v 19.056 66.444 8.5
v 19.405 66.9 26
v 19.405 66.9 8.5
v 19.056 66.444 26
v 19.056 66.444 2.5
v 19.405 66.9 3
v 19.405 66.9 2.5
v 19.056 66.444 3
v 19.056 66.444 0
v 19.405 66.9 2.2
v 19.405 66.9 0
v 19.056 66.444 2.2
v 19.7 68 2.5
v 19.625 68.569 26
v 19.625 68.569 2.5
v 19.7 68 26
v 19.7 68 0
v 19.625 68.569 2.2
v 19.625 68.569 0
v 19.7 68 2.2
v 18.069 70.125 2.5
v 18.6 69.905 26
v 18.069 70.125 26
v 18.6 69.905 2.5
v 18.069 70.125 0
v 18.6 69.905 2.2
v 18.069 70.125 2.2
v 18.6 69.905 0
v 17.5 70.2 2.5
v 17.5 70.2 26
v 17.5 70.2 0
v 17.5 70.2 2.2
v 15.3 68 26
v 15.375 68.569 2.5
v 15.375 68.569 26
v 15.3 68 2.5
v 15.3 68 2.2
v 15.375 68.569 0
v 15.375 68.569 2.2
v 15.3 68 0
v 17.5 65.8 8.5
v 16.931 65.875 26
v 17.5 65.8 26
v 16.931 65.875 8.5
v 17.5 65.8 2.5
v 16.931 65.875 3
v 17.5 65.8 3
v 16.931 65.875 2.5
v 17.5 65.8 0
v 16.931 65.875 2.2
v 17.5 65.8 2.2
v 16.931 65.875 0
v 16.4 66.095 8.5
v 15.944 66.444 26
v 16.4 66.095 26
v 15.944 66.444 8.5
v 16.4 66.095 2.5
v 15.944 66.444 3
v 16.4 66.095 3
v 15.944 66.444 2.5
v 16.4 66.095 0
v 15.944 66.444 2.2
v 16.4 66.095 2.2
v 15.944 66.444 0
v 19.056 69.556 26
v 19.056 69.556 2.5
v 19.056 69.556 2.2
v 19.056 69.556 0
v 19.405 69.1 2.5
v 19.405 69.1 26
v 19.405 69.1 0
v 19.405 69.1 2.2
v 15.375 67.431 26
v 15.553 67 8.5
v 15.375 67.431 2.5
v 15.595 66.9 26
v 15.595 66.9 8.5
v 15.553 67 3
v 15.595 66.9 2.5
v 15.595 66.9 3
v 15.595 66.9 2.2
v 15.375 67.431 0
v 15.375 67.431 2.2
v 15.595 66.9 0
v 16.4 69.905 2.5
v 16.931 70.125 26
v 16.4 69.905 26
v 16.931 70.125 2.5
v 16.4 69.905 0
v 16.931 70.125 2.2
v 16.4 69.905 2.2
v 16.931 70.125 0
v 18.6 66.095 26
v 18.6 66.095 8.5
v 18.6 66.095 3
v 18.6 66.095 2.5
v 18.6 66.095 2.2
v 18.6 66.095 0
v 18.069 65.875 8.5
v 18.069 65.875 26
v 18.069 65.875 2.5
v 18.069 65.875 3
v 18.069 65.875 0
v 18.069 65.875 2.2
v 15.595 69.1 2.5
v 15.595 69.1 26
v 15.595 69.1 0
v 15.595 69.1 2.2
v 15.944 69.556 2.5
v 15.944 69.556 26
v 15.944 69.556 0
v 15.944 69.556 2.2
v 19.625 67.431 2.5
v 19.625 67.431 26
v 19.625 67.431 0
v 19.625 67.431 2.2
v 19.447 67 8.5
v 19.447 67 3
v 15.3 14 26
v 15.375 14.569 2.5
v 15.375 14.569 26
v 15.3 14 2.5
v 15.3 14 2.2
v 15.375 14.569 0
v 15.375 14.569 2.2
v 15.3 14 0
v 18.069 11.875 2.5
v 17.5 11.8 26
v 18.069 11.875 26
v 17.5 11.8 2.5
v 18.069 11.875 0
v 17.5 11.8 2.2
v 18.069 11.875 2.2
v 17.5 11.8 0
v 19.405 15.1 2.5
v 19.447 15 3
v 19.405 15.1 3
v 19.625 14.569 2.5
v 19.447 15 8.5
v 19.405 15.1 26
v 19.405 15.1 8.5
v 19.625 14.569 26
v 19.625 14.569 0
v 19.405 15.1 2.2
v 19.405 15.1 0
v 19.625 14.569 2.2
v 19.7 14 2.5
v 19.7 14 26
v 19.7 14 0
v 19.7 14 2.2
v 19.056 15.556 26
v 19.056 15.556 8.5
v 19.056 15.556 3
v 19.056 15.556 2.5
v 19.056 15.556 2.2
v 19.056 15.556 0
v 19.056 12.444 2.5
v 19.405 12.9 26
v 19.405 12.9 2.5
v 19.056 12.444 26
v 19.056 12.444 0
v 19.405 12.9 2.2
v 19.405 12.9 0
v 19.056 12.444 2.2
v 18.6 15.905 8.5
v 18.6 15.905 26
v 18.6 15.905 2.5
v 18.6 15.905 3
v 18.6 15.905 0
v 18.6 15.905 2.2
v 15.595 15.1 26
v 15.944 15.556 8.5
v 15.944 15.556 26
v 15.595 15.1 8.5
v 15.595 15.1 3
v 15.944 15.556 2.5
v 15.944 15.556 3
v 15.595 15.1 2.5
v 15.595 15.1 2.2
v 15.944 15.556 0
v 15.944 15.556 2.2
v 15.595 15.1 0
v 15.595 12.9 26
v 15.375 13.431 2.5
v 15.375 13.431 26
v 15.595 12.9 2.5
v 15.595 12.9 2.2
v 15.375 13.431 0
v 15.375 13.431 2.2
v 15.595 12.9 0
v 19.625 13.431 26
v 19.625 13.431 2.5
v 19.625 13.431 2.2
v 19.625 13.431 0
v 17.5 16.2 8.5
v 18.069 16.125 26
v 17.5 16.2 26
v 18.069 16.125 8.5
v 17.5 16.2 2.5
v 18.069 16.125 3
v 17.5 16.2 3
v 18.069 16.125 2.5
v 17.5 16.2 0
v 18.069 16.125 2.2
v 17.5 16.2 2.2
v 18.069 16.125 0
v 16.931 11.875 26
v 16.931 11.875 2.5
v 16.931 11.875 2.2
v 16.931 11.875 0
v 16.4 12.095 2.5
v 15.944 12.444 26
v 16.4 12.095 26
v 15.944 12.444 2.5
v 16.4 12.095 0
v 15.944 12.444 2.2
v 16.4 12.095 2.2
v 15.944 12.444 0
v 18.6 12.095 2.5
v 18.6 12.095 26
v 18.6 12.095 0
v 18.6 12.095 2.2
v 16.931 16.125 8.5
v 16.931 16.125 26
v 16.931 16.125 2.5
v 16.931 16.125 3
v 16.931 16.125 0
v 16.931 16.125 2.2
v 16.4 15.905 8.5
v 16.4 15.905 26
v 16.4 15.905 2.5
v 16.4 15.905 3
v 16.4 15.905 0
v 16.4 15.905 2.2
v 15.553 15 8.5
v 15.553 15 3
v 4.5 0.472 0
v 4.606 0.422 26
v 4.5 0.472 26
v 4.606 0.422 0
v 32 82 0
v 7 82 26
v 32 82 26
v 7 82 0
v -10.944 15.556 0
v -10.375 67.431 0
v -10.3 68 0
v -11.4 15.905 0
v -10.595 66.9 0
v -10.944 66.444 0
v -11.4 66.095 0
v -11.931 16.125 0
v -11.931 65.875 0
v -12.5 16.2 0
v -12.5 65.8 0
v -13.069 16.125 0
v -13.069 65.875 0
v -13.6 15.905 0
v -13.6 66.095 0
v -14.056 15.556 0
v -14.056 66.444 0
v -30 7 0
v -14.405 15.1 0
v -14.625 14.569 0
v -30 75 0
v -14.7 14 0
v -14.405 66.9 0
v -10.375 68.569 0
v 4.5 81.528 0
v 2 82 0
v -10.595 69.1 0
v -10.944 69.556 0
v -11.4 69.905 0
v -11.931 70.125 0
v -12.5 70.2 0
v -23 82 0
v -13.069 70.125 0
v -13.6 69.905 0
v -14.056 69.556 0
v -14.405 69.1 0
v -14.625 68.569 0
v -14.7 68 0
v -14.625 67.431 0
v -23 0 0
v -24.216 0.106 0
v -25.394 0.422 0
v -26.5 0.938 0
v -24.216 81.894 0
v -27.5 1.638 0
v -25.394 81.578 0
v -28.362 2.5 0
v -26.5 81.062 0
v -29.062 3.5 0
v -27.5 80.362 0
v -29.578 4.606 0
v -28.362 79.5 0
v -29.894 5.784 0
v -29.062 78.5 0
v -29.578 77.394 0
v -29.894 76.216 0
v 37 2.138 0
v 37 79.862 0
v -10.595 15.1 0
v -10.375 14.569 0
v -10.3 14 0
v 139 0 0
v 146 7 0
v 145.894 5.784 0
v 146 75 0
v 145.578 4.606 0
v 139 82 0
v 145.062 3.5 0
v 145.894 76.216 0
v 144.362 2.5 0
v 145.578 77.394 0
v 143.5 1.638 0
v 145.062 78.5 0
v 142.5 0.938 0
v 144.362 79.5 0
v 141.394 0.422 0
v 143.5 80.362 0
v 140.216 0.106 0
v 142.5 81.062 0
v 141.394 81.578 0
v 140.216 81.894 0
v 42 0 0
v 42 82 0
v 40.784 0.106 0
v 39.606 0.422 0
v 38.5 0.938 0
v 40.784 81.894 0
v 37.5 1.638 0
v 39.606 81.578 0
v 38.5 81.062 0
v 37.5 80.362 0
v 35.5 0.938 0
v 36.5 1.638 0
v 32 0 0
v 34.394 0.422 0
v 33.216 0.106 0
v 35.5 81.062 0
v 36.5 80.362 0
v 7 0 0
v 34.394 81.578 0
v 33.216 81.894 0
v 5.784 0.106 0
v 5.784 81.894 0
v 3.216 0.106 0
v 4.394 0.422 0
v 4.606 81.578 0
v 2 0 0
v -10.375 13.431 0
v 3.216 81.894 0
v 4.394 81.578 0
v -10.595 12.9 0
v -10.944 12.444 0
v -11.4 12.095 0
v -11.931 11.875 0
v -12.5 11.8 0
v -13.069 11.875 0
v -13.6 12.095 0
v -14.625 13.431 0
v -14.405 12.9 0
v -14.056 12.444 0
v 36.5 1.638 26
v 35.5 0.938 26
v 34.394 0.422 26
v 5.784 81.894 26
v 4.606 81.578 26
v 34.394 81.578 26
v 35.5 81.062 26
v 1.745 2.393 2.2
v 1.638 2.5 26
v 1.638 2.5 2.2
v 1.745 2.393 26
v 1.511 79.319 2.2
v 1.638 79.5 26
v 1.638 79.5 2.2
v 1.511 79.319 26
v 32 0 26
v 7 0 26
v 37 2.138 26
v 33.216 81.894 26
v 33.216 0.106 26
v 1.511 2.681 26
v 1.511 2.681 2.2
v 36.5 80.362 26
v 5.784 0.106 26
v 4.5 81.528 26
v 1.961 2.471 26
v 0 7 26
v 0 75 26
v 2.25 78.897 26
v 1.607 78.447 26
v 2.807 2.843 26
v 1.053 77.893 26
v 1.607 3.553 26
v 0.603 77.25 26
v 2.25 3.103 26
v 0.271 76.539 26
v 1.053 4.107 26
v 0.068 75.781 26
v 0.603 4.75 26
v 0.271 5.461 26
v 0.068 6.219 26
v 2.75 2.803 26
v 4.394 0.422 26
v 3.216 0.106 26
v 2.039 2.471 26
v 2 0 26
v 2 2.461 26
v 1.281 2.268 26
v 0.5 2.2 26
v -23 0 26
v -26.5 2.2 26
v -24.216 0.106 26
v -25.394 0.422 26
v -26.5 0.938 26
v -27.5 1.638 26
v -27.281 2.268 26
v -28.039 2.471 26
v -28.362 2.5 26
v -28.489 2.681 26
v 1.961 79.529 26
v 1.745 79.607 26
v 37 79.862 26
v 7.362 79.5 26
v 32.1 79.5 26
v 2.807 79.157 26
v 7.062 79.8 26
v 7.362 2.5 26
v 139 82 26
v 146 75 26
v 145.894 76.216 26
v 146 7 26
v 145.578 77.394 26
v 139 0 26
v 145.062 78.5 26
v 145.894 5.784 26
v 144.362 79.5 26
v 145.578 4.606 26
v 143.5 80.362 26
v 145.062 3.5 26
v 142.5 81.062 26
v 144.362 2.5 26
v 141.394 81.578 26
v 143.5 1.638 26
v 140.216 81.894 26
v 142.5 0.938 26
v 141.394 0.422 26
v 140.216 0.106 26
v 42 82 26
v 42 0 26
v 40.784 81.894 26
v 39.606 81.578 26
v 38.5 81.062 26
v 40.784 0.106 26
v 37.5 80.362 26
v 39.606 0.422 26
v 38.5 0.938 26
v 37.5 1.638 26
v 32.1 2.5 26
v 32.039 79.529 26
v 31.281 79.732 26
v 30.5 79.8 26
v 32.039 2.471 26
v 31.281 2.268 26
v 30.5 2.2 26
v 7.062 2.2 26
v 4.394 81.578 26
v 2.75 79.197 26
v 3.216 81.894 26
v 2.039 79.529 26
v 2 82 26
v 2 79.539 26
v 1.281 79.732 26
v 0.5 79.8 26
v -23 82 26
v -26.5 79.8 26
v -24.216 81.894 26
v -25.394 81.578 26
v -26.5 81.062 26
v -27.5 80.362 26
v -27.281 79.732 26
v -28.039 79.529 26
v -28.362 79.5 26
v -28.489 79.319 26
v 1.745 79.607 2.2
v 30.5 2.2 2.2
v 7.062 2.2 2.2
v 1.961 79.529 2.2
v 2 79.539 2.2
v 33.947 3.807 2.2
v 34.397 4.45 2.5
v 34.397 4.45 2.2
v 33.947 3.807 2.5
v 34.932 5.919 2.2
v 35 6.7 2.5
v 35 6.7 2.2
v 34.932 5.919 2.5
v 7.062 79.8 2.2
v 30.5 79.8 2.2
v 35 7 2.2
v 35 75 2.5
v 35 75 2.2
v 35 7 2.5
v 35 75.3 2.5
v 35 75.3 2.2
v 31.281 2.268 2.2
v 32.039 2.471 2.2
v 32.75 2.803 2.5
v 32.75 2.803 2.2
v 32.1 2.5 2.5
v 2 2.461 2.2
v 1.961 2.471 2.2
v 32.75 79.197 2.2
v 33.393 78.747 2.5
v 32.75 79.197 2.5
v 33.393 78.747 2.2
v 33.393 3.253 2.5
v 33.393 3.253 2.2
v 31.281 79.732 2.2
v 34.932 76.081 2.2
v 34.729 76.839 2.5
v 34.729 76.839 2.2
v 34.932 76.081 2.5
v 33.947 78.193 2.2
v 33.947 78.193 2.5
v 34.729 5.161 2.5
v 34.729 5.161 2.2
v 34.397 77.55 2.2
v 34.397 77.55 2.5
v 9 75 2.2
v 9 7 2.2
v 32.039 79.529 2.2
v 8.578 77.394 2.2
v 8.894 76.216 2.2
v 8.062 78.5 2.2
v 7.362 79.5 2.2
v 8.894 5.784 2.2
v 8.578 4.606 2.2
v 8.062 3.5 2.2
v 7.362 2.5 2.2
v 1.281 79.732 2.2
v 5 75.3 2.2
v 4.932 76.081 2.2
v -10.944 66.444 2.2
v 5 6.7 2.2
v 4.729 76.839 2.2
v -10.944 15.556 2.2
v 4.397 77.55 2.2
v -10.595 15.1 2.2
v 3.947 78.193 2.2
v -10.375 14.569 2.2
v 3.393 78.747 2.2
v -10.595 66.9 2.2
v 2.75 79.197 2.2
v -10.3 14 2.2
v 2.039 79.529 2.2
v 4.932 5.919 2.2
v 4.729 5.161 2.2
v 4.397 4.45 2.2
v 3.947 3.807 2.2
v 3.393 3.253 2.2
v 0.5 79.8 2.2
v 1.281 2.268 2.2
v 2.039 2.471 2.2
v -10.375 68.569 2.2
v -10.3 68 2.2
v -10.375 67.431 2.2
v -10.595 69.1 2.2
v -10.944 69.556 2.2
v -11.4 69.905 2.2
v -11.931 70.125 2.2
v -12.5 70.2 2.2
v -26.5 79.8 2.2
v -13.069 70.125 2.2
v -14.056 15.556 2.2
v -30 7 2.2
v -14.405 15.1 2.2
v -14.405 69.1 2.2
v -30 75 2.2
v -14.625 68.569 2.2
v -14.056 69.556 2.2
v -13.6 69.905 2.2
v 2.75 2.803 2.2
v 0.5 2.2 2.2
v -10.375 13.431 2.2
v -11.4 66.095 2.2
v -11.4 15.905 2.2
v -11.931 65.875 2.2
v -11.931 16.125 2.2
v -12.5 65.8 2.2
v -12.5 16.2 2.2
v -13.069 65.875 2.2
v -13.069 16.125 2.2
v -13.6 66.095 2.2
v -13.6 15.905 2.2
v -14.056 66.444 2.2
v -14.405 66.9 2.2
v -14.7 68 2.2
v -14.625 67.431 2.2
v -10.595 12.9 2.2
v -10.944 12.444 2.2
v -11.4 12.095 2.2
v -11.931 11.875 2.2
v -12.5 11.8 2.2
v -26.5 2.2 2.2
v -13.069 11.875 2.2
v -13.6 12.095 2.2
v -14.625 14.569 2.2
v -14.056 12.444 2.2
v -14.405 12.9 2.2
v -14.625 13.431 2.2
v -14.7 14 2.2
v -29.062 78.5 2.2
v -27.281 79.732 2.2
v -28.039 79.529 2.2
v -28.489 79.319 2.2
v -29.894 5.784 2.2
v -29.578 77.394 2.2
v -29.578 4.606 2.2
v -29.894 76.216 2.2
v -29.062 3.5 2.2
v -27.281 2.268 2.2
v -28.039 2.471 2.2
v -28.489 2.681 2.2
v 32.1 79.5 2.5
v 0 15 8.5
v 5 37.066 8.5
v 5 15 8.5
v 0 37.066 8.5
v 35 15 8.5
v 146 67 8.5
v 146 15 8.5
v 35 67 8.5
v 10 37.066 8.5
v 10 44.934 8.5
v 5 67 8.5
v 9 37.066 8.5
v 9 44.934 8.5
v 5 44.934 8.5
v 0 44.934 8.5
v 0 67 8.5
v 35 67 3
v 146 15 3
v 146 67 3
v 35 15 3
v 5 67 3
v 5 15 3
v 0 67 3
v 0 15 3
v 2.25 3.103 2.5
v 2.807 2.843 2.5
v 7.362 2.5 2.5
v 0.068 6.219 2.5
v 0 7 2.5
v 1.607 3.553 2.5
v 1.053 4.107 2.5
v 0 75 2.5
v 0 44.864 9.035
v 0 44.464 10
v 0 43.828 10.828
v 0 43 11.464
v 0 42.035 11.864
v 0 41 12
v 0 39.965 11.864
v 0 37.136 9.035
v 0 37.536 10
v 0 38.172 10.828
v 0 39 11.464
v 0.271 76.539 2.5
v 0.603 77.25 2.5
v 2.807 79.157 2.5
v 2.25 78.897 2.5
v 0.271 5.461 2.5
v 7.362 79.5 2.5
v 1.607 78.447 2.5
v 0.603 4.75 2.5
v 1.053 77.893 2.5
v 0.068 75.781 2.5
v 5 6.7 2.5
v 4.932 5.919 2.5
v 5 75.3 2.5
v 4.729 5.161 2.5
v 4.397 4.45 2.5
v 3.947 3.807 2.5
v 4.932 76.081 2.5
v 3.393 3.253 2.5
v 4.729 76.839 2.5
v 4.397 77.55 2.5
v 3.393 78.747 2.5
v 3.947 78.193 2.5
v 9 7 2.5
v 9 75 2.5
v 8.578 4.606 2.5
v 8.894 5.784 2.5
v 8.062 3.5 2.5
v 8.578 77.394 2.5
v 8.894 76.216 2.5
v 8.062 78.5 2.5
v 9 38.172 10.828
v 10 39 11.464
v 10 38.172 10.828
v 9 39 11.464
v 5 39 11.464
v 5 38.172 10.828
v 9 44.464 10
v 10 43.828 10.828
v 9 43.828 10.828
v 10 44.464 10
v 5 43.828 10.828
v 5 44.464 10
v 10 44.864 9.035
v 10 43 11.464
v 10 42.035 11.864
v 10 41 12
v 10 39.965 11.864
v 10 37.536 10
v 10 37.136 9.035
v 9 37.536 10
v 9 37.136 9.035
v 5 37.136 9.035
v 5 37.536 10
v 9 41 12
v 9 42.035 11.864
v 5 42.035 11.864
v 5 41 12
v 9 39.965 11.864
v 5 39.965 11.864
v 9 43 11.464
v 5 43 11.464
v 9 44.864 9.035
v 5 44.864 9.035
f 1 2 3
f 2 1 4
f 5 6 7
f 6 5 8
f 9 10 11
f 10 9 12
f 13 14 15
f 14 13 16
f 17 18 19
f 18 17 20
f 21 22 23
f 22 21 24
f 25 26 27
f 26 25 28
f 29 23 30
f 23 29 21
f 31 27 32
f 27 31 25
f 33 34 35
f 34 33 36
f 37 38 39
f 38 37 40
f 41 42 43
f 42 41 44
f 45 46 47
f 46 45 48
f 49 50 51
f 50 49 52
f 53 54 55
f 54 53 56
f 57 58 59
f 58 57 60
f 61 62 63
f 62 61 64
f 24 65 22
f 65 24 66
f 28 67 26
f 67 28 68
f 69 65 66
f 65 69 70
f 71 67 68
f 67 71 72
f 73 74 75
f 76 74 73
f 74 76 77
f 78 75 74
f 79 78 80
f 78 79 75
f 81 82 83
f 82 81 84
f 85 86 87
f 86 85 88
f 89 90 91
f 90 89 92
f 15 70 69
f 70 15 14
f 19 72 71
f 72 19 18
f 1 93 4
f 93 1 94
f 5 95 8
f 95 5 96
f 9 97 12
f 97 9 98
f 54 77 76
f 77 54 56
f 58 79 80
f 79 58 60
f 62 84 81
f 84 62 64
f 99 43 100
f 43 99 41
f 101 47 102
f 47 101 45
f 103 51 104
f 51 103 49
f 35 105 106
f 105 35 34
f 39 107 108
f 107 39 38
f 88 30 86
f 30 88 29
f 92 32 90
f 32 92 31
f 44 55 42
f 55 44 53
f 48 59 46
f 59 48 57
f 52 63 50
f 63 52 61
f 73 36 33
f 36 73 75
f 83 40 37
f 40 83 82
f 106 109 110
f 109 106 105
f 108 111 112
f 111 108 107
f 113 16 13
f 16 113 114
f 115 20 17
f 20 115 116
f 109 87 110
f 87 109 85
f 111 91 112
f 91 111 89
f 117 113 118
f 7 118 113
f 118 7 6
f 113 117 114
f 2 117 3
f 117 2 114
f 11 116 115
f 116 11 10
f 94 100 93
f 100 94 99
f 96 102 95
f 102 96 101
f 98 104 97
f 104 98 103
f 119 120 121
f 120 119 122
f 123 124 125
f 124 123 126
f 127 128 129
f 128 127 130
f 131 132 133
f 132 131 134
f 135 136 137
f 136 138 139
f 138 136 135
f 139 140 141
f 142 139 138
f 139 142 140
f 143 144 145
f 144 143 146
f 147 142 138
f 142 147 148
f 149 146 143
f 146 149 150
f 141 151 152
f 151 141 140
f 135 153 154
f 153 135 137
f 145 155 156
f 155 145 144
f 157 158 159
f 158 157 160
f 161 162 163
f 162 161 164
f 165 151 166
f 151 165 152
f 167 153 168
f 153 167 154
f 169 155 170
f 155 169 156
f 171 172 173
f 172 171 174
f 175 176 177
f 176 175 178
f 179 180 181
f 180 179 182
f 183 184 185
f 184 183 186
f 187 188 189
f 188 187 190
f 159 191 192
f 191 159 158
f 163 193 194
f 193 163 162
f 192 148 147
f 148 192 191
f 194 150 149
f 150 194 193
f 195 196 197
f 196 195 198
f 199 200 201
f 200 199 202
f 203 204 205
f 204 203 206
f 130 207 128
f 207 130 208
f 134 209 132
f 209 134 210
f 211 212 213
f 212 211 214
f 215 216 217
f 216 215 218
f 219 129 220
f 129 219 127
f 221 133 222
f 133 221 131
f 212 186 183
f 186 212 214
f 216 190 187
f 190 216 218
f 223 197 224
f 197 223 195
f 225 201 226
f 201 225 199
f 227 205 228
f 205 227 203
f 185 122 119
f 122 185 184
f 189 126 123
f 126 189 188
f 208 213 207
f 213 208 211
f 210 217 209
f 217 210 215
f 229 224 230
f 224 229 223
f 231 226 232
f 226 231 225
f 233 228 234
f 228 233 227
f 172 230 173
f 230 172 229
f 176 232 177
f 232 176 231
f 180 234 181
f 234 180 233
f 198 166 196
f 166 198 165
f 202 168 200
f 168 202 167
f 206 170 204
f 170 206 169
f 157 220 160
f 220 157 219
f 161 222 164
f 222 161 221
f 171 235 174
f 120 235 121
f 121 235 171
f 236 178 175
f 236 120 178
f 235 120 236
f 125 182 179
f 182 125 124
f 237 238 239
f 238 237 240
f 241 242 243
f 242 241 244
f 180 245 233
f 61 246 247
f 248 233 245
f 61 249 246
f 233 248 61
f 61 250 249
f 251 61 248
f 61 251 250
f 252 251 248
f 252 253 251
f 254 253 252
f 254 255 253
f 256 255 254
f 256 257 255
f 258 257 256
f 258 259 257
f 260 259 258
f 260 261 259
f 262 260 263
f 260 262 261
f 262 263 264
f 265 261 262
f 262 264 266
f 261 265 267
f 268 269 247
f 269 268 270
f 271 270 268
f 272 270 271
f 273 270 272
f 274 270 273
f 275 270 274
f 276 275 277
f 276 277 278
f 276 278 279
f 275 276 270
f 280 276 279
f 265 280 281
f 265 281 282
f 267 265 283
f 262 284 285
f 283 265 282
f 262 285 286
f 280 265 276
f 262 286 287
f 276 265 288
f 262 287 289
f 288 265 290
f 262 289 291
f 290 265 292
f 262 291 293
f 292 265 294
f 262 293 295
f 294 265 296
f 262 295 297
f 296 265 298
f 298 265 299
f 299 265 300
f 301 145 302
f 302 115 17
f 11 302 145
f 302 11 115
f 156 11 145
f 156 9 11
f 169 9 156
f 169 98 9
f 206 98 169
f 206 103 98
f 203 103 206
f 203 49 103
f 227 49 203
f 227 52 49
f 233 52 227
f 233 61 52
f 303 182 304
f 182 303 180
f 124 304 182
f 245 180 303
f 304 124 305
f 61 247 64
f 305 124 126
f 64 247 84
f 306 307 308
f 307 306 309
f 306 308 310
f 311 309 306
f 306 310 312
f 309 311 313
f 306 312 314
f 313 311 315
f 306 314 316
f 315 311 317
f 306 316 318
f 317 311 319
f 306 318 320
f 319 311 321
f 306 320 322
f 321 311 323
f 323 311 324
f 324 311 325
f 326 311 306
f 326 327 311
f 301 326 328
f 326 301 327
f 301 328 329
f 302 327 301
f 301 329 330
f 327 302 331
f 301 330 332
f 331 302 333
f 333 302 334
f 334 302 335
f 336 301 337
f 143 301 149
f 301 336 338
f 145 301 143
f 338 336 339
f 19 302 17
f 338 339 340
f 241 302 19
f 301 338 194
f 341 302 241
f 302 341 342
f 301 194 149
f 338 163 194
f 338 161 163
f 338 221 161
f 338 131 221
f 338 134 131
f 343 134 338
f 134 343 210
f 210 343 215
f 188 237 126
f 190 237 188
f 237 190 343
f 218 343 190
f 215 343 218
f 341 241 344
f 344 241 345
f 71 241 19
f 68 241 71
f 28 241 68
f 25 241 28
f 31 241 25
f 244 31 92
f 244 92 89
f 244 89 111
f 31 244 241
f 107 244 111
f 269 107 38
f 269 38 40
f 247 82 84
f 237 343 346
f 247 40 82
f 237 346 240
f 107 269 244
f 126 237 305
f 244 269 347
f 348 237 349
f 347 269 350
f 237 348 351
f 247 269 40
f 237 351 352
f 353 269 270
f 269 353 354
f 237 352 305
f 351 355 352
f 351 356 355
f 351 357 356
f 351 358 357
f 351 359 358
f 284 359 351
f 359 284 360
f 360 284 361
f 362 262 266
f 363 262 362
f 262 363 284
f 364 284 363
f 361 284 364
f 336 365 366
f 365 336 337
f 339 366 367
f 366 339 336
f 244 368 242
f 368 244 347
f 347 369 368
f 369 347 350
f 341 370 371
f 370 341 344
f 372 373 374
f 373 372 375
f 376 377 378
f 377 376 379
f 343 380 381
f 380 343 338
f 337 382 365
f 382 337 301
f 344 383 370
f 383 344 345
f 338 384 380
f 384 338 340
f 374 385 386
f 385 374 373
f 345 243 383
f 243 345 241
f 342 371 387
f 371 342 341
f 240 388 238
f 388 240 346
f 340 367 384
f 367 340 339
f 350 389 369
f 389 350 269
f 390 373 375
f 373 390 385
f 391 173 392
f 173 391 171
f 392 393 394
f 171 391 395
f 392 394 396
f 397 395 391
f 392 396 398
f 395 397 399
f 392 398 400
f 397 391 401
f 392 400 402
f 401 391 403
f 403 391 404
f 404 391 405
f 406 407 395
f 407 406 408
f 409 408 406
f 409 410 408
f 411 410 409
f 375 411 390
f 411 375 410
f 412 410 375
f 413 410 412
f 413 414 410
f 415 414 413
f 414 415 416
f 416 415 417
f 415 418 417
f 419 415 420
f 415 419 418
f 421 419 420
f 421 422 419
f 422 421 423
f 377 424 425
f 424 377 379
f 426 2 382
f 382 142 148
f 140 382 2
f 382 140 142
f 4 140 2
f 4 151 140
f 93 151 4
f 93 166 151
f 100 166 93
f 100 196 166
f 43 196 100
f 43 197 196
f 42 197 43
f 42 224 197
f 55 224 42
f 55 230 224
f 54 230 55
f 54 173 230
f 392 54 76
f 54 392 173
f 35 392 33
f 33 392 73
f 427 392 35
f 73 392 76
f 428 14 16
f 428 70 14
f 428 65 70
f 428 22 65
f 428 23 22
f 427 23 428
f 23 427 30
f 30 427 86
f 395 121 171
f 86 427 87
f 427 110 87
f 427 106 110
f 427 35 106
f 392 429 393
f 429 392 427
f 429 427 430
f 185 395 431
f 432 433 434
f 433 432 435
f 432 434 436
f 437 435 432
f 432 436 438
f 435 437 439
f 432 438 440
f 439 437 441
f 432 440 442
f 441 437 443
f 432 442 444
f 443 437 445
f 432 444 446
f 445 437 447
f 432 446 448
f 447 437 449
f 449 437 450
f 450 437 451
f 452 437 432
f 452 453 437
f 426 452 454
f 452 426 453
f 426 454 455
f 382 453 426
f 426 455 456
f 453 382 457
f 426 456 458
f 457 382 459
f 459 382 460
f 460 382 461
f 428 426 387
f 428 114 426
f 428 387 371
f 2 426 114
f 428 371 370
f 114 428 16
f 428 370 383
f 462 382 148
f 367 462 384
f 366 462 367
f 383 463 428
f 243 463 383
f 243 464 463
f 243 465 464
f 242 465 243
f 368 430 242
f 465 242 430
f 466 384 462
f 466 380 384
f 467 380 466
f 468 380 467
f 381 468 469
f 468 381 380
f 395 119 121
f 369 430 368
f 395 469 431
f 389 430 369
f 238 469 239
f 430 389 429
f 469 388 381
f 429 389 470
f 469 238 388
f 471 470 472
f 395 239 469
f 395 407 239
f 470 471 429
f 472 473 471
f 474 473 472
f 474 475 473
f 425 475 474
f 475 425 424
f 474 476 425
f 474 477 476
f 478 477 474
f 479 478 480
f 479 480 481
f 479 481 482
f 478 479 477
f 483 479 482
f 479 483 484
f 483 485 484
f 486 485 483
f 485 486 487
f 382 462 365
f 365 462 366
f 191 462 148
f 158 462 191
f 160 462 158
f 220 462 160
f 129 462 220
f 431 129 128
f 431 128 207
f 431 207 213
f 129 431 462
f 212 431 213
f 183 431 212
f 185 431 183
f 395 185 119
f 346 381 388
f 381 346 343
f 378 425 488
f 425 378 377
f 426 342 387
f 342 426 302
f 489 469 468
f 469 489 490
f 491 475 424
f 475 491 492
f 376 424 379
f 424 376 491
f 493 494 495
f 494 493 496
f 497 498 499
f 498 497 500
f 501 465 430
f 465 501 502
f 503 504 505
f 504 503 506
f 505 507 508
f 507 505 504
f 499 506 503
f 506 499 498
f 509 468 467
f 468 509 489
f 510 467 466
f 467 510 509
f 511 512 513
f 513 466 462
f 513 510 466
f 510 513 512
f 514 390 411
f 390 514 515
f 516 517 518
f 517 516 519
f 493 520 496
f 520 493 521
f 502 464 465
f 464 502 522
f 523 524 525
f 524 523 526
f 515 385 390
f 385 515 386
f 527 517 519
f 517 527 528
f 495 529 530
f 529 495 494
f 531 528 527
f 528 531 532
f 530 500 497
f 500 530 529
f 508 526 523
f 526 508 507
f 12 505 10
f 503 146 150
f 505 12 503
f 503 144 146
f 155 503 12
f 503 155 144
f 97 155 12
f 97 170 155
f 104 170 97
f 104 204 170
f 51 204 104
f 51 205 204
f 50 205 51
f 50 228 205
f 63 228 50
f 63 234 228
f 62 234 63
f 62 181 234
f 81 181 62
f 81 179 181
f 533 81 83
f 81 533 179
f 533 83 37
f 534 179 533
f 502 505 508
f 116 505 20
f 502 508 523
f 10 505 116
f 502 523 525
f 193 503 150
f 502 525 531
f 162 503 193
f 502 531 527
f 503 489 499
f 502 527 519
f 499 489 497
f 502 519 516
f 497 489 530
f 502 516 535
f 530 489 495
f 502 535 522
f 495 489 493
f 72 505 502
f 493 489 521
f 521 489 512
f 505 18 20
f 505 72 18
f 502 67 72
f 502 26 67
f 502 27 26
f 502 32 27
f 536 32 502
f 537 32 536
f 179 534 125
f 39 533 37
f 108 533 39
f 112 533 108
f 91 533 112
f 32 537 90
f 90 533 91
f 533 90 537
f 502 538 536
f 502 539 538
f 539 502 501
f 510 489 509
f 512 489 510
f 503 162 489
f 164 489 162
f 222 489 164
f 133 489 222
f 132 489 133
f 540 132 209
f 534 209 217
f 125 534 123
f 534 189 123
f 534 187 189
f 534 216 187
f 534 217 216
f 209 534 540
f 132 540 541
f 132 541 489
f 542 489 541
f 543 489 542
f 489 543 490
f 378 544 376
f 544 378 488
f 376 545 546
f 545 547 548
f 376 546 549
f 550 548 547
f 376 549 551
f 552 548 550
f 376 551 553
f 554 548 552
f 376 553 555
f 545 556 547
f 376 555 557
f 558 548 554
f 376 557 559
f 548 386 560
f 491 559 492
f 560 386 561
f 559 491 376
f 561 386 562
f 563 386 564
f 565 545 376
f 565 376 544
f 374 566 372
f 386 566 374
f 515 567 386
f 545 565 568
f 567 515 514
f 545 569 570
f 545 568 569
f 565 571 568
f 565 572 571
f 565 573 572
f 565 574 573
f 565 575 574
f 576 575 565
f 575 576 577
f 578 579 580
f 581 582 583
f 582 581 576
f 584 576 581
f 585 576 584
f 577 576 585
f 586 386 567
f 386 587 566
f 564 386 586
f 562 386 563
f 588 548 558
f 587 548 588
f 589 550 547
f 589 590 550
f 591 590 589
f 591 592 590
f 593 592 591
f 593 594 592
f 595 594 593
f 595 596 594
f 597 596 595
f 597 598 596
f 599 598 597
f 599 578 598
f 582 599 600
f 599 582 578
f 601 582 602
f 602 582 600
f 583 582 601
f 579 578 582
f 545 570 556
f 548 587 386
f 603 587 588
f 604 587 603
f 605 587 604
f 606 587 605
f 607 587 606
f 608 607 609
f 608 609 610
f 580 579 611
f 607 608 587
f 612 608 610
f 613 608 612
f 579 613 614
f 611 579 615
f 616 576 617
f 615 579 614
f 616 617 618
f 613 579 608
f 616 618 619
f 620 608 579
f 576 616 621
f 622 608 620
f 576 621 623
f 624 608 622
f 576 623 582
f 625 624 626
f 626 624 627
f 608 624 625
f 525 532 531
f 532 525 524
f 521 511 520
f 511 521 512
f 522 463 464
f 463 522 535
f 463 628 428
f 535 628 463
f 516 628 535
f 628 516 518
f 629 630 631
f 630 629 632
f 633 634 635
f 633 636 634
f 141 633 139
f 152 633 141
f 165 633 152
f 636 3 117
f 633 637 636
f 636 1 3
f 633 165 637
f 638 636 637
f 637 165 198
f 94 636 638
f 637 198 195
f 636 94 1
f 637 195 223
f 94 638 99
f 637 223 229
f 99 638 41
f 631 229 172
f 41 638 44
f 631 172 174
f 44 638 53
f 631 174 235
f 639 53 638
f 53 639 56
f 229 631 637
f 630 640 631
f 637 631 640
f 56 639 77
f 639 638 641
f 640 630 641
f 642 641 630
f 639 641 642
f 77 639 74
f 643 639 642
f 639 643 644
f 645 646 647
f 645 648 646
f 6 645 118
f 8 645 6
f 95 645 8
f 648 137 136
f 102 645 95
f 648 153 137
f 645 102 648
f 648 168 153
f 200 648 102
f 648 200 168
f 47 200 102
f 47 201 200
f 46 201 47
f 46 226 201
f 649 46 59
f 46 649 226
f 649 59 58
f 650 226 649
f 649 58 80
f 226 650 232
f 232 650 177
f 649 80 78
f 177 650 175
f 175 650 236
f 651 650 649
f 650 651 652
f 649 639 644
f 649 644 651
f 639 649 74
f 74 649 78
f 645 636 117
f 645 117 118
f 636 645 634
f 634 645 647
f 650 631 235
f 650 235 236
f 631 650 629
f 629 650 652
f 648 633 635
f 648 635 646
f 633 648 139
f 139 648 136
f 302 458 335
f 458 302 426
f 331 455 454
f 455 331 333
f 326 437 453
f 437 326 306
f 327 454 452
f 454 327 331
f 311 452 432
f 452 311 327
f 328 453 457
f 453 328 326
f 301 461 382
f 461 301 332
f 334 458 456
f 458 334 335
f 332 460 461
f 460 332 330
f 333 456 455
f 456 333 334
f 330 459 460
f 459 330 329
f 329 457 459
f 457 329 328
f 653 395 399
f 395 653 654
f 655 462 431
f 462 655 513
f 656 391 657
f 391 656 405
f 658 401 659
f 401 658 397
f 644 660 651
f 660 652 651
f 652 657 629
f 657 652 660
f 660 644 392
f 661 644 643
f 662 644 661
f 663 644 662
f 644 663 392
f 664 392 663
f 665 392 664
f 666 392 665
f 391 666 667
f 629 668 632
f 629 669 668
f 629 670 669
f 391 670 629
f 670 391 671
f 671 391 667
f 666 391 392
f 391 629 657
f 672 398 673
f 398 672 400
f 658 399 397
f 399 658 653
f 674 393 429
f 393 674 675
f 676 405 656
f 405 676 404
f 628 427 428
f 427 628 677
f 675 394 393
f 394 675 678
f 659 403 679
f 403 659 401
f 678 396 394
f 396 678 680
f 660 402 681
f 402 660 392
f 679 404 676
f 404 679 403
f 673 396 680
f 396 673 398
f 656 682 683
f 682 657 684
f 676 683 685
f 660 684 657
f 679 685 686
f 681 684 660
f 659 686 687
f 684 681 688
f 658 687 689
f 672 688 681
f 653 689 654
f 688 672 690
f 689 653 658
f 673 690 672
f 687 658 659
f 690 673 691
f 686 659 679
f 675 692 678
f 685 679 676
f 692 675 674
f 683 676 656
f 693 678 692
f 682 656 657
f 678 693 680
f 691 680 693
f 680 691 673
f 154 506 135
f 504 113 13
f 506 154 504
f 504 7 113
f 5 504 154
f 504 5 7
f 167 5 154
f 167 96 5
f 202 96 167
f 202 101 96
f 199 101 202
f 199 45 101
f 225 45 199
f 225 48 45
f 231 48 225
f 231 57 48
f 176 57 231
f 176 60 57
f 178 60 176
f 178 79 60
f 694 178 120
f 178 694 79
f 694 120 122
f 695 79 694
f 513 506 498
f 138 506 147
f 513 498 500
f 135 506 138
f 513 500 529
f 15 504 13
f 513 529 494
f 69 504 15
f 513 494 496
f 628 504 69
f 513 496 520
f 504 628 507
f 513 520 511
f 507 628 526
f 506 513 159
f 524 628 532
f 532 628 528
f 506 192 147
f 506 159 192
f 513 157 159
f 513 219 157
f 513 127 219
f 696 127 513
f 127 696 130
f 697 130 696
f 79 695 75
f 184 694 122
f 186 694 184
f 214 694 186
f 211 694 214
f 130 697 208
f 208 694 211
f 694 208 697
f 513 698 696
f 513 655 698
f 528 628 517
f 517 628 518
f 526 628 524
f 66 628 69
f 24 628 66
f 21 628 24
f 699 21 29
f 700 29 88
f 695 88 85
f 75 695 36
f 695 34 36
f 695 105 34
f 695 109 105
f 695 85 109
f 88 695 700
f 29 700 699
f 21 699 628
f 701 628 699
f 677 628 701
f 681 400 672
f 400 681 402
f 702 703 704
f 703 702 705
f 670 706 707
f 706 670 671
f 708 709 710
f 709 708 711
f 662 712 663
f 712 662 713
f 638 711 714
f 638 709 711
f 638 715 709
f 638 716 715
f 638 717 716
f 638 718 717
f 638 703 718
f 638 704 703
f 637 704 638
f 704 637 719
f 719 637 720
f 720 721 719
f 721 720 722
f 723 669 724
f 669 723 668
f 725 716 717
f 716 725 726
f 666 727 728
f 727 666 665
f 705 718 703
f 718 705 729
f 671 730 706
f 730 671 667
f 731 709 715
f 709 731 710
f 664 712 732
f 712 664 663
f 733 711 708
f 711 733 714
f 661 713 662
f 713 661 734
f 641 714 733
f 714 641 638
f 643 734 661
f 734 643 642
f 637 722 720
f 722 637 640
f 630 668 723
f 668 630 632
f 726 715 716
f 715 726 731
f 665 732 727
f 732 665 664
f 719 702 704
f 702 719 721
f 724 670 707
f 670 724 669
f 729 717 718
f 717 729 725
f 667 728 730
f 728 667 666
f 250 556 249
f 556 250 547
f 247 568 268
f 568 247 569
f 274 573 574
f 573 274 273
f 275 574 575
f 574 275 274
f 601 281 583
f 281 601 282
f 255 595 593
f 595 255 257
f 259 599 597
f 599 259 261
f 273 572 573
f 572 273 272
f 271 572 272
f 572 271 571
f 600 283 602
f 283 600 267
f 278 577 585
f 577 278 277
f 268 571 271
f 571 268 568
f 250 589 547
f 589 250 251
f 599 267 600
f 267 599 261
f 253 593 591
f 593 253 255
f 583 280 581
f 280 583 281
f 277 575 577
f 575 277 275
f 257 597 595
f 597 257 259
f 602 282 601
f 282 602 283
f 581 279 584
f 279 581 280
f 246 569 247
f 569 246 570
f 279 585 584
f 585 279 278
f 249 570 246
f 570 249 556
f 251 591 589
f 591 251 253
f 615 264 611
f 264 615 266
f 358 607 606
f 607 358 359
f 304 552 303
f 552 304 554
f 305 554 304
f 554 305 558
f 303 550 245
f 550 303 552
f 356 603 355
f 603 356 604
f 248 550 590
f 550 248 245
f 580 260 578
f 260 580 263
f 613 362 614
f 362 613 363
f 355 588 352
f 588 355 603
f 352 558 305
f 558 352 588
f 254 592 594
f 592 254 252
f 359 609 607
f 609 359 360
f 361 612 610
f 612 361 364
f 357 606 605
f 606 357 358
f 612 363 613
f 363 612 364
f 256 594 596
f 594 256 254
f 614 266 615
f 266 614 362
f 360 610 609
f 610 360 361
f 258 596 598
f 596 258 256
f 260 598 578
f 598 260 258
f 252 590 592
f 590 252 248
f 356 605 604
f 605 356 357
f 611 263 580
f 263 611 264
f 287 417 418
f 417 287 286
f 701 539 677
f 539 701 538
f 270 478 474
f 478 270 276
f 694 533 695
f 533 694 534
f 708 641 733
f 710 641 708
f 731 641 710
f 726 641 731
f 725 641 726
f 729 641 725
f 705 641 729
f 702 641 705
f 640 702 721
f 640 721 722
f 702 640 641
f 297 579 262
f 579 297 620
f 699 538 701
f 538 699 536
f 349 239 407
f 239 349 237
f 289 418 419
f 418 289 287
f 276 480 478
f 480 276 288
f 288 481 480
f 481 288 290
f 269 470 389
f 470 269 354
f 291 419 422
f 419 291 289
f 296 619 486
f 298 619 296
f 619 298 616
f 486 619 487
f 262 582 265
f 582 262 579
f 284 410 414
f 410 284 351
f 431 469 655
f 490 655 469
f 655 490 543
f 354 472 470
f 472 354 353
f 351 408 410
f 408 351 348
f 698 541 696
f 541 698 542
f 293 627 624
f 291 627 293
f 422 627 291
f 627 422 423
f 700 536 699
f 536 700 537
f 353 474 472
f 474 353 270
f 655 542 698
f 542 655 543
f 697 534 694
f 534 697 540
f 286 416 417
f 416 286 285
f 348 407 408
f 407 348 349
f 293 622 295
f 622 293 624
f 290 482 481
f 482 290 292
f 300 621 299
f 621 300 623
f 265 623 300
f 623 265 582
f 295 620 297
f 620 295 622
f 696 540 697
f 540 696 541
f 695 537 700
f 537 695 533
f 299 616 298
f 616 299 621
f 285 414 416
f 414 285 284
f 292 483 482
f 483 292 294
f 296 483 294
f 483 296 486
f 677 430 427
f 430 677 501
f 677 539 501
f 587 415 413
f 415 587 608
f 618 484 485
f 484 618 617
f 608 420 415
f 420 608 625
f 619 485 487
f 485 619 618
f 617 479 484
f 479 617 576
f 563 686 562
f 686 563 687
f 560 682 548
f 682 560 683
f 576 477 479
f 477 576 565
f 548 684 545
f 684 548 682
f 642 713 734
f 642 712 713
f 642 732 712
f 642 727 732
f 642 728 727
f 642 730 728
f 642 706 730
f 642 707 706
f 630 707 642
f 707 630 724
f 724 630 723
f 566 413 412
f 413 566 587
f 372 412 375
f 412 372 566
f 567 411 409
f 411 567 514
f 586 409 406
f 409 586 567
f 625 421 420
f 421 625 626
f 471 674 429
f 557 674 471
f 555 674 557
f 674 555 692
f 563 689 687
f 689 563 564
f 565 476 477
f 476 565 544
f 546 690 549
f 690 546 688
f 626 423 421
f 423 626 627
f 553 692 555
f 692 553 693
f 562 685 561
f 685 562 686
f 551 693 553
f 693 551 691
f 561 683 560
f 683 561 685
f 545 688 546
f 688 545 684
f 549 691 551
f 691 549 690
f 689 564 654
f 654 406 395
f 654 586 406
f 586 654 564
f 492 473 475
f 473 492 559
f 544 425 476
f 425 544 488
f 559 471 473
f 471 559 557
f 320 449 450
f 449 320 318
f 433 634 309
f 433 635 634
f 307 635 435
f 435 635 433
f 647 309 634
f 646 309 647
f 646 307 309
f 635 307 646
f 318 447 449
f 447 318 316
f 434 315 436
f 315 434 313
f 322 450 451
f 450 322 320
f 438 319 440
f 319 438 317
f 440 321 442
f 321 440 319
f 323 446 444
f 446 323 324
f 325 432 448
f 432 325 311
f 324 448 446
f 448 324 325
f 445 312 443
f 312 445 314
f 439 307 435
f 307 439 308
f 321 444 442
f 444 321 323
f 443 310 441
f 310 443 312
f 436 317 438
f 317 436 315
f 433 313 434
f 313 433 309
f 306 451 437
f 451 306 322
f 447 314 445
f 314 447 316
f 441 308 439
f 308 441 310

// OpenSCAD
// file: test_cradle_prototype.scad
$fn = 36;

// Parámetros
pod_l = 126.0;
pod_w = 82.0;
pod_base_h = 26.0;
pod_r = 7.0;
pod_wall = 2.8;

cradle_depth = 35.0;
cradle_wall = 2.5;
cradle_floor = 2.5;
cradle_tol = 0.3; // Holgura para encastre suave de TPU sobre ASA

strap_slot_w = 52.0;
strap_slot_h = 5.5;
tunnel_t = 3.0;

module r_box(l, w, h, r) {
    hull() {
        translate([r, r, 0]) cylinder(r=r, h=h);
        translate([l-r, r, 0]) cylinder(r=r, h=h);
        translate([r, w-r, 0]) cylinder(r=r, h=h);
        translate([l-r, w-r, 0]) cylinder(r=r, h=h);
    }
}

// 1. Cuna receptora en TPU (el brazo que sale del puente)
module tpu_cradle_sleeve() {
    color([0.18, 0.20, 0.22]) // TPU grafito
    difference() {
        // Bloque exterior continuo con el perfil del pod
        r_box(cradle_depth + 4, pod_w, pod_base_h, pod_r);

        // Cavidad/Bolsillo interior donde entra la lengüeta del pod
        translate([-1, cradle_wall - cradle_tol, cradle_floor - cradle_tol]) {
            r_box(cradle_depth + 1, pod_w - 2*(cradle_wall - cradle_tol), 
                  pod_base_h + 2, max(1, pod_r - cradle_wall));
        }

        // Túnel pasacorreas inferior
        translate([-5, (pod_w - strap_slot_w)/2, tunnel_t]) {
            cube([cradle_depth + 15, strap_slot_w, strap_slot_h]);
        }

        // Taladros para tornillos M4 de fijación (2 laterales)
        for (dy = [pod_w/2 - 14, -pod_w/2 + 14]) {
            translate([cradle_depth/2, pod_w/2 + dy, -5])
                cylinder(r=2.2, h=pod_base_h + 10, $fn=24);
        }

        // Pasacables hacia el interior del puente (X=0)
        translate([-5, pod_w/2, 8.0])
            rotate([0, 90, 0]) cylinder(r=4.0, h=15, $fn=24);
    }
}

// 2. Base rígida en ASA con el escalón macho rebajado
module asa_pod_with_step() {
    color([0.94, 0.42, 0.12]) // ASA Naranja
    difference() {
        union() {
            // Sección frontal completa (X = cradle_depth a pod_l)
            translate([cradle_depth, 0, 0]) {
                difference() {
                    r_box(pod_l - cradle_depth, pod_w, pod_base_h, pod_r);
                    // Cara de tope plana en X=0 local
                }
            }
            // Lengüeta rebajada que embona en la cuna de TPU (X = 0 a cradle_depth)
            translate([0, cradle_wall, cradle_floor]) {
                r_box(cradle_depth + 1, pod_w - 2*cradle_wall, pod_base_h - cradle_floor, max(1, pod_r - cradle_wall));
            }
        }

        // Túnel pasacorreas continuo
        translate([-5, (pod_w - strap_slot_w)/2, tunnel_t]) {
            cube([pod_l + 10, strap_slot_w, strap_slot_h]);
        }

        // Taladros M4 alineados con la cuna
        for (dy = [pod_w/2 - 14, -pod_w/2 + 14]) {
            translate([cradle_depth/2, pod_w/2 + dy, -5])
                cylinder(r=2.2, h=pod_base_h + 10, $fn=24);
        }

        // Pasacables frontal en la lengüeta
        translate([-5, pod_w/2, 8.0])
            rotate([0, 90, 0]) cylinder(r=4.0, h=15, $fn=24);
    }
}

// Visualización ensamblada: Cuna TPU + Base ASA
tpu_cradle_sleeve();
asa_pod_with_step();
// main file
include <test_cradle_prototype.scad>

// Separados para vista explosionada
translate([-30, 0, 0]) tpu_cradle_sleeve();
translate([20, 0, 0]) asa_pod_with_step();
